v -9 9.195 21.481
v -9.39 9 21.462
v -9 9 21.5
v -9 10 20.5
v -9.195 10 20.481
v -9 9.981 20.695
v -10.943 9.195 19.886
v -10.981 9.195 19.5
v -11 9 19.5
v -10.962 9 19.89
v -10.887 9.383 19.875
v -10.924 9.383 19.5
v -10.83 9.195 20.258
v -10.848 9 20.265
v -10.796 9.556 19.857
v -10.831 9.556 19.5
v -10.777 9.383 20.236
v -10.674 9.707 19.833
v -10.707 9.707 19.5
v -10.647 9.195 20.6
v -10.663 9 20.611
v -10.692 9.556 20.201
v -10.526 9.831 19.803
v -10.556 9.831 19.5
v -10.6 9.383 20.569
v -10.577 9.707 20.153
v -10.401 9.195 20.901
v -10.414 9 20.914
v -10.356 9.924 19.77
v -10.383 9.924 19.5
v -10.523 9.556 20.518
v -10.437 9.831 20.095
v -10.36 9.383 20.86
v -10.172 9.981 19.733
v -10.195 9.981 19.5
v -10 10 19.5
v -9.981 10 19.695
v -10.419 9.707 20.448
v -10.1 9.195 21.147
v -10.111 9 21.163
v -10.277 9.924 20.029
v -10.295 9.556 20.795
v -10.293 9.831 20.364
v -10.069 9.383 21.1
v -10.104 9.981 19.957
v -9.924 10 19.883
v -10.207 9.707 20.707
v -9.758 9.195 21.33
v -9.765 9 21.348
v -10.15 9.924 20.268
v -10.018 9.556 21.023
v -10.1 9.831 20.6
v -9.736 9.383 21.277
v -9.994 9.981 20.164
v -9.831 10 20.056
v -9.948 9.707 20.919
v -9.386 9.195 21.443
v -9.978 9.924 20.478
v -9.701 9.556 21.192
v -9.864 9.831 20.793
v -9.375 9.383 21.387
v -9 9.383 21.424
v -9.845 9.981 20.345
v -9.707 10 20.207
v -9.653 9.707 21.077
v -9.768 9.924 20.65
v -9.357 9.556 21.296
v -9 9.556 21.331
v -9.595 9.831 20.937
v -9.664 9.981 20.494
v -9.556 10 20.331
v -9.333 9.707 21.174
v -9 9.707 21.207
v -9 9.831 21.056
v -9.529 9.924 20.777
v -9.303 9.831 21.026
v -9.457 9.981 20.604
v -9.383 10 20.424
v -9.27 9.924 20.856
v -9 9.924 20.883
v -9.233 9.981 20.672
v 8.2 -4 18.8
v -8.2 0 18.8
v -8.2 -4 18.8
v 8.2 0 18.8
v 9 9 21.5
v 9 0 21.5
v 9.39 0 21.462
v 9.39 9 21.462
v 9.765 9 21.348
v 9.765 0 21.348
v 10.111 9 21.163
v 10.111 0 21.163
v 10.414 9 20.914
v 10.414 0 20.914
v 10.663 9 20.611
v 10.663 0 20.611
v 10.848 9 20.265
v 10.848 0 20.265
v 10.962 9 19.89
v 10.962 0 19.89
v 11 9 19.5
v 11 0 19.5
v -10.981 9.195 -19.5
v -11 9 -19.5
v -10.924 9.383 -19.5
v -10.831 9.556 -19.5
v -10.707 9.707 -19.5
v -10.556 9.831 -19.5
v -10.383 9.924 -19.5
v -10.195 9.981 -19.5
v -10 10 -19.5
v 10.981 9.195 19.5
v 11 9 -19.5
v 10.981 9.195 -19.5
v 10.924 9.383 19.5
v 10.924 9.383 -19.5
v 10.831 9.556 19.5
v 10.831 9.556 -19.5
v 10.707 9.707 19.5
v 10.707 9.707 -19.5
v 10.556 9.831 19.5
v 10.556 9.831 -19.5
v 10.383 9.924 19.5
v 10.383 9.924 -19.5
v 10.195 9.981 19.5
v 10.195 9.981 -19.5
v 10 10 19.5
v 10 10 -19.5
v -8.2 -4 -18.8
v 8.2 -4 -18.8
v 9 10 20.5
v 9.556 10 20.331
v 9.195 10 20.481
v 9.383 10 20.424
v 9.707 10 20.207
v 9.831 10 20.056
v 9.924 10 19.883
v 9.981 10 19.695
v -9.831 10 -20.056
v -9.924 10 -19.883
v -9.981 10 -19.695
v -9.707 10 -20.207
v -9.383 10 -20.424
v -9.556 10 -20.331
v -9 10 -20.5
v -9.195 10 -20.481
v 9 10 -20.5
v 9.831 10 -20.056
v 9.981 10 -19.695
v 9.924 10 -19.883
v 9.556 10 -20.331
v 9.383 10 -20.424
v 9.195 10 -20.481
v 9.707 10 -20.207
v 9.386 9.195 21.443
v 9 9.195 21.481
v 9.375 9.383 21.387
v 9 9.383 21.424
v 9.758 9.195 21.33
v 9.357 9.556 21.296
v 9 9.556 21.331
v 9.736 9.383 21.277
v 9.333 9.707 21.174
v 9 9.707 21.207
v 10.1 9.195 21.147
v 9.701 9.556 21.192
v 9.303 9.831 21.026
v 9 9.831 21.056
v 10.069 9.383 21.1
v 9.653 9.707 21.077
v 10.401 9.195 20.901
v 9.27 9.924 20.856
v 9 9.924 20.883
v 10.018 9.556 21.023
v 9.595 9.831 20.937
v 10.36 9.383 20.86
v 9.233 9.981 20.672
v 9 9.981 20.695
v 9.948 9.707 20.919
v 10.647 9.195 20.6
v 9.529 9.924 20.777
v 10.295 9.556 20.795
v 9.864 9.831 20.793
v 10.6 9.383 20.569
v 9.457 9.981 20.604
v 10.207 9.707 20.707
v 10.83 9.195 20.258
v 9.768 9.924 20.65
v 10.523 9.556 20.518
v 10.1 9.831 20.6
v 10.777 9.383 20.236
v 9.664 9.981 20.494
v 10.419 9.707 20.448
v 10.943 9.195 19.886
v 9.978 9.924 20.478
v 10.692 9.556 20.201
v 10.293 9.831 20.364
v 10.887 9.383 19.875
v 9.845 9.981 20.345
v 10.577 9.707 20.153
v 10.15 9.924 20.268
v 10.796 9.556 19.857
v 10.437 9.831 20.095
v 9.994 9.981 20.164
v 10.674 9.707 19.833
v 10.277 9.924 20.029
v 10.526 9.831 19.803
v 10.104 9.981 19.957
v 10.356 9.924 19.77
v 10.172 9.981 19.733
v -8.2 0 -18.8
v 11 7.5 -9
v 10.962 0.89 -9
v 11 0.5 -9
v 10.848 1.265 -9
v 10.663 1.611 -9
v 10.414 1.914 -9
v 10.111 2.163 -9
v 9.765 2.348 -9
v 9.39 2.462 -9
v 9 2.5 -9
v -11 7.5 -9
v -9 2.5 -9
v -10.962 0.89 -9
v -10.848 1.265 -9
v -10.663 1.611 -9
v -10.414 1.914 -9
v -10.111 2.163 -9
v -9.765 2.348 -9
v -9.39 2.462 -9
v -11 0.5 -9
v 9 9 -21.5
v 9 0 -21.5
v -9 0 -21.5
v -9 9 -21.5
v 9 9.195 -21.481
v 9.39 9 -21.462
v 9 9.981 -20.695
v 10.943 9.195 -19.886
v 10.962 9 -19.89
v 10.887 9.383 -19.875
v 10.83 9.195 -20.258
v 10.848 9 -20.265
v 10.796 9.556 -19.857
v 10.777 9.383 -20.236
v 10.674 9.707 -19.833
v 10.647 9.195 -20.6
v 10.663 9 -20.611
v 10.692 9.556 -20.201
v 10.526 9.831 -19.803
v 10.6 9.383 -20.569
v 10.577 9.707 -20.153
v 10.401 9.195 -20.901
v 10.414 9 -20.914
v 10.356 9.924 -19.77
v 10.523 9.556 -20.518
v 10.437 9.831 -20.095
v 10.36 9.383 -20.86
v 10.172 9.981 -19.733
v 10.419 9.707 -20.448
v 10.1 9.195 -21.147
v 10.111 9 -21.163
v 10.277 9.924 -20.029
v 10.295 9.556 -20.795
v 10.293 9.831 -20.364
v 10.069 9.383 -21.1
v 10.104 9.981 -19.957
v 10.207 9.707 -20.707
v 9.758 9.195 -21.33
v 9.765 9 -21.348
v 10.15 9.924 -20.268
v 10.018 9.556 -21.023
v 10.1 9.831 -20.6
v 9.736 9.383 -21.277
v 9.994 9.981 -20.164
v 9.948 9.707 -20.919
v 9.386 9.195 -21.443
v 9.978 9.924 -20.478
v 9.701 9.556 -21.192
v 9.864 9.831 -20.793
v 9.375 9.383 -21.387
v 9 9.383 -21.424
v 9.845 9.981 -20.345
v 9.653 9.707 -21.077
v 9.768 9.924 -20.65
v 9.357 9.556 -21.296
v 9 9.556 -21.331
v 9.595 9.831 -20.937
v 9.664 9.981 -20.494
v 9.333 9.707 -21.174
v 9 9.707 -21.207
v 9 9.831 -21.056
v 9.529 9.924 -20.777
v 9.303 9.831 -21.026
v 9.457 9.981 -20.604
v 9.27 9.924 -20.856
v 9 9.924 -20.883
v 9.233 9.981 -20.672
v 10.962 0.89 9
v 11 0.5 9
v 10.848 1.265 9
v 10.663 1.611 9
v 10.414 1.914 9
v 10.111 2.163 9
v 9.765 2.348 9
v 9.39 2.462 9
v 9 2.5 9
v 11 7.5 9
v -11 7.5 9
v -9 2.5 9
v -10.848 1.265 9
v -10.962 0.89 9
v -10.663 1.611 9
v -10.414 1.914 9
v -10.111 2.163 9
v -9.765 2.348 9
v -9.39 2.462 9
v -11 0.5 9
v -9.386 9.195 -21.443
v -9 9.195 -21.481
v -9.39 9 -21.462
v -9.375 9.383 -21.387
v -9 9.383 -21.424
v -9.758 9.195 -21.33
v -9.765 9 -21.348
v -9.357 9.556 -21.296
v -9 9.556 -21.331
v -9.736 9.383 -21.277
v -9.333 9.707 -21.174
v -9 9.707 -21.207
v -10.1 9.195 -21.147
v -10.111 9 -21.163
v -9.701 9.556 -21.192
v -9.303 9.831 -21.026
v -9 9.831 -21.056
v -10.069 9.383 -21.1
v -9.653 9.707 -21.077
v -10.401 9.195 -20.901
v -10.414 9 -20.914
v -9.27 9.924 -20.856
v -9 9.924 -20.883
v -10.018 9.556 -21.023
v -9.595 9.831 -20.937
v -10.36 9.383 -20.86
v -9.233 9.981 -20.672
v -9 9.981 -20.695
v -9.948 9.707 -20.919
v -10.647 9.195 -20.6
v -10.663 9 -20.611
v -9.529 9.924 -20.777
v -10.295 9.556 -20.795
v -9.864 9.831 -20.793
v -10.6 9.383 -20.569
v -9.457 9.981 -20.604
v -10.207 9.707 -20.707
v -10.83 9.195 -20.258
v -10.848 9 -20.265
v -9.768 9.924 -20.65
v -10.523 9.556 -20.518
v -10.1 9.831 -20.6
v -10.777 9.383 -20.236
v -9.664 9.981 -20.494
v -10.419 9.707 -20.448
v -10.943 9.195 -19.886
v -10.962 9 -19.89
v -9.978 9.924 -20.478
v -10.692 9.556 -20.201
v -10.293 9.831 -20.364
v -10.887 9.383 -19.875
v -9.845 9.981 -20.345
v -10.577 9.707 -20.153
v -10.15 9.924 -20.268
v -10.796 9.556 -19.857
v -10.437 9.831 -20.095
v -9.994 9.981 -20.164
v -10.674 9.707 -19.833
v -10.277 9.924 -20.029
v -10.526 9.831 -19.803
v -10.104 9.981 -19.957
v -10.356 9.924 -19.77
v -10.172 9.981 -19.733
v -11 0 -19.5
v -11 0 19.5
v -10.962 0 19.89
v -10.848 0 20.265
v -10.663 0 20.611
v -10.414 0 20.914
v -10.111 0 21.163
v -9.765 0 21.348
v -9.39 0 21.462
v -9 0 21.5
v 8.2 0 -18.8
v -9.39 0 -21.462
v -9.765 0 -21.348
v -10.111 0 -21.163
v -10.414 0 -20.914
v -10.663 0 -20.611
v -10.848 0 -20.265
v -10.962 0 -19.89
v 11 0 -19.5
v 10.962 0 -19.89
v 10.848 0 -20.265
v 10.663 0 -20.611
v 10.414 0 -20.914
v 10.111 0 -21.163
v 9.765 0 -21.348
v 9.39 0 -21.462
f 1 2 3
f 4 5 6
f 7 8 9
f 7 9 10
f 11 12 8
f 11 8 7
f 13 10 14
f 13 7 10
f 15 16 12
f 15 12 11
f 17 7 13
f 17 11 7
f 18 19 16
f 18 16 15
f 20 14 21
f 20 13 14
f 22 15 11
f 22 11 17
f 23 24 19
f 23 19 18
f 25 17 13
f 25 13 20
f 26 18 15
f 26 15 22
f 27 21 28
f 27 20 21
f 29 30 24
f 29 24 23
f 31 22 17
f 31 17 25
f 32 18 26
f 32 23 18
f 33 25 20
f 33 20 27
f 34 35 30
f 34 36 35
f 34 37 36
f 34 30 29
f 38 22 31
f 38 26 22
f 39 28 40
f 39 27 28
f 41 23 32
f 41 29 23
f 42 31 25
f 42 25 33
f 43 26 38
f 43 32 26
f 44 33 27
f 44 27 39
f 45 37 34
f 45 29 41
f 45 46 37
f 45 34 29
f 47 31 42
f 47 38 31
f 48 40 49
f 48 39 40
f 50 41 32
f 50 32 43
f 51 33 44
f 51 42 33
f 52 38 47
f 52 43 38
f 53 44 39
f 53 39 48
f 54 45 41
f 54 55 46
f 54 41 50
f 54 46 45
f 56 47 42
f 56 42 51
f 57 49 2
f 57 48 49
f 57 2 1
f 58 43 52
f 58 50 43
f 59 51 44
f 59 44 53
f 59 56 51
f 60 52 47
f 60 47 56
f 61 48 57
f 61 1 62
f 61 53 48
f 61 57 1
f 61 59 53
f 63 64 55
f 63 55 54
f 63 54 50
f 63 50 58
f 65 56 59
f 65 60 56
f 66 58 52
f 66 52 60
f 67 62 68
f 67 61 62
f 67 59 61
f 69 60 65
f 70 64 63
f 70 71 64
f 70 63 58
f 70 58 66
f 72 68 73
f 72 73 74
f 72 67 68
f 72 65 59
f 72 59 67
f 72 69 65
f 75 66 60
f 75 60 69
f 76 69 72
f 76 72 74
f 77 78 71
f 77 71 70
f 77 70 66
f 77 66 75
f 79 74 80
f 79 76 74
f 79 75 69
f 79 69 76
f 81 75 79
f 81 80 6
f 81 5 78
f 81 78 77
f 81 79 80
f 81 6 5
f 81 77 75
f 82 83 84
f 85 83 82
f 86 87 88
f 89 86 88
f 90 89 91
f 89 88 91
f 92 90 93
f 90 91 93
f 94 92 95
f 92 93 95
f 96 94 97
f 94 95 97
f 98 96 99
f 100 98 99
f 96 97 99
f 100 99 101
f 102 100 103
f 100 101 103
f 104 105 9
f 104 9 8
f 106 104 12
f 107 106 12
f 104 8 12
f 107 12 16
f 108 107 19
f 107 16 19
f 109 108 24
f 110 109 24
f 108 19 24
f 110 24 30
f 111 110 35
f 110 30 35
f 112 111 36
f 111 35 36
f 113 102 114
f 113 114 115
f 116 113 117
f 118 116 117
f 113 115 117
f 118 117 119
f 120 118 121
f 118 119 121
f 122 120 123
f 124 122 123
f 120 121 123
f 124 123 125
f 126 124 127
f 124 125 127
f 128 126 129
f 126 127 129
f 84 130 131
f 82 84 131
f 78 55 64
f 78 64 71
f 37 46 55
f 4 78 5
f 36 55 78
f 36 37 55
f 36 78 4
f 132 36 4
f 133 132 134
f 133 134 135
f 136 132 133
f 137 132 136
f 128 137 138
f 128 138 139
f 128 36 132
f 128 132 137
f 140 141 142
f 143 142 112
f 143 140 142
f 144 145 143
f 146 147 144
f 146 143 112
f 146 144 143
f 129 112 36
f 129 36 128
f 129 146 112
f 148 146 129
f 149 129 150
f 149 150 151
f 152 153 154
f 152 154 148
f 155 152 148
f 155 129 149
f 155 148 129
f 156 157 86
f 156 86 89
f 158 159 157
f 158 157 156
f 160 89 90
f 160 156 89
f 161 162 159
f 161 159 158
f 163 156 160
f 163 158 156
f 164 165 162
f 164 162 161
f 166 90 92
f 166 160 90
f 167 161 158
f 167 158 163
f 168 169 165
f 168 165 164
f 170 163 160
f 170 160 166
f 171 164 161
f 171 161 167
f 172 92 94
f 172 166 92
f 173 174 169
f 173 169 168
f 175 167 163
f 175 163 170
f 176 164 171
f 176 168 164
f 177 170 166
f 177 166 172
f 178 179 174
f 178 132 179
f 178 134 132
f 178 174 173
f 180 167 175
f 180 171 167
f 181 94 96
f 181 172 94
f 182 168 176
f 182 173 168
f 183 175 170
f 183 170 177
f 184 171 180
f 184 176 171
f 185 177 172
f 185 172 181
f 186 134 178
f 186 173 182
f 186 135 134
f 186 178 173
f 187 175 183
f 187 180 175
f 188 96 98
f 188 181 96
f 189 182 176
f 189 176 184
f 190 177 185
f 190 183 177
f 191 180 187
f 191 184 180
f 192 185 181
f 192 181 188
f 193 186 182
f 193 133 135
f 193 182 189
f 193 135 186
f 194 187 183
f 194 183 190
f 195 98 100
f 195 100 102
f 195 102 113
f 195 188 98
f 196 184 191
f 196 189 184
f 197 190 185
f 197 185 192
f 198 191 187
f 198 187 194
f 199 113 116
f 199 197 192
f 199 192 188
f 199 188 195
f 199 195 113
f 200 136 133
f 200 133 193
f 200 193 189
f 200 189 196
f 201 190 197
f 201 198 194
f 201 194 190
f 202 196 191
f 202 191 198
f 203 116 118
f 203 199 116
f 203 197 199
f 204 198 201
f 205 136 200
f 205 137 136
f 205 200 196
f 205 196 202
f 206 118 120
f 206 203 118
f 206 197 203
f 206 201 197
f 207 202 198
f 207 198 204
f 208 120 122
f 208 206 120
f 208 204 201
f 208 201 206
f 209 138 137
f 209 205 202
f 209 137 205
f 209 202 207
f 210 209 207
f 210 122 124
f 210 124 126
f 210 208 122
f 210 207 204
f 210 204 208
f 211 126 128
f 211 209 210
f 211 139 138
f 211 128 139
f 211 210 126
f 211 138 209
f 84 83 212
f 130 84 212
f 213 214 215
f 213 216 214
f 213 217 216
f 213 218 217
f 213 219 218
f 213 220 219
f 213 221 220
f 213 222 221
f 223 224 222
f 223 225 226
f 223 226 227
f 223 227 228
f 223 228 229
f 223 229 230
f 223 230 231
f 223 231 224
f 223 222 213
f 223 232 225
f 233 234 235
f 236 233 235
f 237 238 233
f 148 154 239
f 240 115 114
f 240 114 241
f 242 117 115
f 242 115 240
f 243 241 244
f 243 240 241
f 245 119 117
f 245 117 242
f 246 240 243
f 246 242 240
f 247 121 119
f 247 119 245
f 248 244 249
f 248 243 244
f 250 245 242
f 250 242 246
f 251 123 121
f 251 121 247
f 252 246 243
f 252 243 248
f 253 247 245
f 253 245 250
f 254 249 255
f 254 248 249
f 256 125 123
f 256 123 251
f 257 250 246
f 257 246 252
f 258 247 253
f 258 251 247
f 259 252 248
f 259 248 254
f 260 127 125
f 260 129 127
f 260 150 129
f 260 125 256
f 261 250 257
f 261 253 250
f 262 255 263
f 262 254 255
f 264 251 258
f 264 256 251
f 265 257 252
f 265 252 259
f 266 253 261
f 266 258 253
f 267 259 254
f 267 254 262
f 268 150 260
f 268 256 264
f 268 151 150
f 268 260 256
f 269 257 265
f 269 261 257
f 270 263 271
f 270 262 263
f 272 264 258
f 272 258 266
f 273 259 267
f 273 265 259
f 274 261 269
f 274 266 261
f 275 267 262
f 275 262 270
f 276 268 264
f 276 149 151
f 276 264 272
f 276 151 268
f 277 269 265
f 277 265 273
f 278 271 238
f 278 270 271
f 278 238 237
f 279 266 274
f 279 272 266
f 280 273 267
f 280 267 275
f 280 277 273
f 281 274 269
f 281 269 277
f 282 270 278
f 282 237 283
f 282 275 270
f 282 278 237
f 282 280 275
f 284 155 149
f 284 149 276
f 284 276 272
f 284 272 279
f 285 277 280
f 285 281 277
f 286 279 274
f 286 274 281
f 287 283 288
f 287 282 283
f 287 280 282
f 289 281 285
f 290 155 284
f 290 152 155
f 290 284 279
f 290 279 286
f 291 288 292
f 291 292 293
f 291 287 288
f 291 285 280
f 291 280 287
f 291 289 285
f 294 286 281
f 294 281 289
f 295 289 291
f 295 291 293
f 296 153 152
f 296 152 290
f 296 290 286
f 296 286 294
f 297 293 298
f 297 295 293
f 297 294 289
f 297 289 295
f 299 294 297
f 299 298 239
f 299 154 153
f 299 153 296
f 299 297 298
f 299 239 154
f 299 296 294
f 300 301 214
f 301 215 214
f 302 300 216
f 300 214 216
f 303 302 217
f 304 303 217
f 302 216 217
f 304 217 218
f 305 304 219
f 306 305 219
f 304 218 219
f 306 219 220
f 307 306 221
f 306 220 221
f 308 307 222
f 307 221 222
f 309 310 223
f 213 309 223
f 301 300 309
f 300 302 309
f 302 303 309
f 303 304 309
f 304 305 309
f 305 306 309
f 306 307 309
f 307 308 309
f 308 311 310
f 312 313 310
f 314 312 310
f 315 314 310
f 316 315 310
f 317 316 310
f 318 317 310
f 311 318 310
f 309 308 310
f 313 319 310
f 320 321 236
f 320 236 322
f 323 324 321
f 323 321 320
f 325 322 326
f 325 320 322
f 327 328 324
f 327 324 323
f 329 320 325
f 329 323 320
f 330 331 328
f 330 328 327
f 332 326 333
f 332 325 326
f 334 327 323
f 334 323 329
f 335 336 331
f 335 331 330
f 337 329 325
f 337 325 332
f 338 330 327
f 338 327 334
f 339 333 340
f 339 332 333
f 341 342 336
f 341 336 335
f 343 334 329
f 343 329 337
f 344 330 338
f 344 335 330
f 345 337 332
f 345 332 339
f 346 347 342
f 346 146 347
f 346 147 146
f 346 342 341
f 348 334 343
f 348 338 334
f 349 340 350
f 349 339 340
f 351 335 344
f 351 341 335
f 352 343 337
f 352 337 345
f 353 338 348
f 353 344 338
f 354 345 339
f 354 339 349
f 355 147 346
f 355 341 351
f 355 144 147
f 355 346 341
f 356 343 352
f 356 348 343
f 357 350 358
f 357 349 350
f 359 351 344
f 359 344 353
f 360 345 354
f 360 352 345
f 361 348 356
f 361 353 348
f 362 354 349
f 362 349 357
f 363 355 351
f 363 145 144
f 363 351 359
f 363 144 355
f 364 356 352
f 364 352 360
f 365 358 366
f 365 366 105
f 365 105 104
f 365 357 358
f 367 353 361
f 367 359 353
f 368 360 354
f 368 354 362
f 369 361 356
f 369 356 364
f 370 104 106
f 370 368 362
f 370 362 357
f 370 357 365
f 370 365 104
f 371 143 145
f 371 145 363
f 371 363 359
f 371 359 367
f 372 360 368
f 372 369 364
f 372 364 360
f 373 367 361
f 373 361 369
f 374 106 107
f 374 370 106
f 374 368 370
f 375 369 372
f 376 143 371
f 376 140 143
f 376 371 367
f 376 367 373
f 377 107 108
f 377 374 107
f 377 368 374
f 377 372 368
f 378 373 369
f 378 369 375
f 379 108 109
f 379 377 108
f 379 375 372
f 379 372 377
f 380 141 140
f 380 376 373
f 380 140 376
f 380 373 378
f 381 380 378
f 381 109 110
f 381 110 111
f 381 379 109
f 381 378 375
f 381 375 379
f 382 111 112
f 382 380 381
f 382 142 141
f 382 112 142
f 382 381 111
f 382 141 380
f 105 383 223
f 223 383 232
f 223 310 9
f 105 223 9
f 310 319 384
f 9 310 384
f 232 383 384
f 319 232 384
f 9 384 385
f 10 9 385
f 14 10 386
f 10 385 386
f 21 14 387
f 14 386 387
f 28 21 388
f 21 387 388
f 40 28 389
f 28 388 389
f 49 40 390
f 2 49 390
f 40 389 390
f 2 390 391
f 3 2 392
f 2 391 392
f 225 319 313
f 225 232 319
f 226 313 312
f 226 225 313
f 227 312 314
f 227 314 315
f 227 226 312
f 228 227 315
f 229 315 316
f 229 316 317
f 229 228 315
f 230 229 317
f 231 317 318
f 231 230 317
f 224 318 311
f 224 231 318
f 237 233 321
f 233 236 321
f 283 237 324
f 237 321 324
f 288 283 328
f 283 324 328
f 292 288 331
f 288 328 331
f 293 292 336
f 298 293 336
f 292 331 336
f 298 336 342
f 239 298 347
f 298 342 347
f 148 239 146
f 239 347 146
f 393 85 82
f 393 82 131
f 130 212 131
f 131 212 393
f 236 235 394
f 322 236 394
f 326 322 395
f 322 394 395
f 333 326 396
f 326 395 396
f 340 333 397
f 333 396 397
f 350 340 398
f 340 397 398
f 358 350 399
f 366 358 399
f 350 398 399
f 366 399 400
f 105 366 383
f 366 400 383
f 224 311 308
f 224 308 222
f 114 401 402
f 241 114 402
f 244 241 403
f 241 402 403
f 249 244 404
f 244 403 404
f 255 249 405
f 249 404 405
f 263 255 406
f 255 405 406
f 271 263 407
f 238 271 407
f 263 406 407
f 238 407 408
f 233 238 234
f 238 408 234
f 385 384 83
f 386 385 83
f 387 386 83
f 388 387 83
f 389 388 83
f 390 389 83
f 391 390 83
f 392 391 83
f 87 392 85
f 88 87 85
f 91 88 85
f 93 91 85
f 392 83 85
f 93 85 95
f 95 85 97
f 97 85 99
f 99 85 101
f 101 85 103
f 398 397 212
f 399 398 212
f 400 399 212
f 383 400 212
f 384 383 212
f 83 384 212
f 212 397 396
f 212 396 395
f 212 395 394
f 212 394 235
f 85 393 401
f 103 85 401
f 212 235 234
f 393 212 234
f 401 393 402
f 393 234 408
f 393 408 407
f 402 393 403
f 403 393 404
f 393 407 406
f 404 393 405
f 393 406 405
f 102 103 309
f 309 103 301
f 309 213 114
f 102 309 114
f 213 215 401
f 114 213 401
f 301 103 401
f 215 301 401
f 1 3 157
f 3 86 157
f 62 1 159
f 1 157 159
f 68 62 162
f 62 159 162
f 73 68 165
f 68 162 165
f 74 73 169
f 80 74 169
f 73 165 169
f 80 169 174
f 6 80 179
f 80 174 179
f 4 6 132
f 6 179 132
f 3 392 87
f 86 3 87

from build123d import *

# Parameters (mm, degrees)
BOSS_EXTRUDE1_DEPTH = 10
SKETCH1_4_W         = 16.4
SKETCH1_4_H         = 37.6
BOSS_EXTRUDE2_DEPTH = 4
SKETCH3_W           = 18
SKETCH3_H           = 5
CUT_EXTRUDE2_DEPTH  = 41.099875312
FILLET1_R           = 2
FILLET2_R           = 1


with BuildPart() as part:
    # Sketch1 → Boss-Extrude1 (new body)
    with BuildSketch(Plane(origin=(0, 0, 0), x_dir=(1, 0, 0), z_dir=(0, 1, 0))):
        with BuildLine():
            Line((-9, -21.5), (9, -21.5))
            ThreePointArc((9, -21.5), (10.414213562, -20.914213562), (11, -19.5))
            Line((11, -19.5), (11, 19.5))
            ThreePointArc((11, 19.5), (10.414213562, 20.914213562), (9, 21.5))
            Line((9, 21.5), (-9, 21.5))
            ThreePointArc((-9, 21.5), (-10.414213562, 20.914213562), (-11, 19.5))
            Line((-11, 19.5), (-11, -19.5))
            ThreePointArc((-11, -19.5), (-10.414213562, -20.914213562), (-9, -21.5))
        make_face()
    extrude(amount=BOSS_EXTRUDE1_DEPTH)

    # Sketch1<4> → Boss-Extrude2 (add)
    with BuildSketch(Plane(origin=(0, 0, 0), x_dir=(1, 0, 0), z_dir=(0, 1, 0))):
        Rectangle(SKETCH1_4_W, SKETCH1_4_H)
    extrude(amount=-BOSS_EXTRUDE2_DEPTH)

    # Sketch3 → Cut-Extrude2 (cut, through all)
    with BuildSketch(Plane(origin=(-11, 0, 10.5), x_dir=(0, 0, -1), z_dir=(1, 0, 0))):
        with Locations((10.5, 5)):
            Rectangle(SKETCH3_W, SKETCH3_H)
    extrude(amount=CUT_EXTRUDE2_DEPTH, mode=Mode.SUBTRACT)

    # Fillet1
    fillet1_edges = [part.edges().sort_by_distance(p)[0] for p in [
        (-11, 2.5, 0),
        (11, 2.5, 0),
    ]]
    fillet(fillet1_edges, radius=FILLET1_R)

    # Fillet2
    fillet2_edges = [part.edges().sort_by_distance(p)[0] for p in [
        (10.414213562, 10, -20.914213562),
        (11, 10, 0),
        (10.414213562, 10, 20.914213562),
        (0, 10, 21.5),
        (-10.414213562, 10, 20.914213562),
        (-11, 10, 0),
        (-10.414213562, 10, -20.914213562),
        (0, 10, -21.5),
    ]]
    fillet(fillet2_edges, radius=FILLET2_R)


solid = part.part
